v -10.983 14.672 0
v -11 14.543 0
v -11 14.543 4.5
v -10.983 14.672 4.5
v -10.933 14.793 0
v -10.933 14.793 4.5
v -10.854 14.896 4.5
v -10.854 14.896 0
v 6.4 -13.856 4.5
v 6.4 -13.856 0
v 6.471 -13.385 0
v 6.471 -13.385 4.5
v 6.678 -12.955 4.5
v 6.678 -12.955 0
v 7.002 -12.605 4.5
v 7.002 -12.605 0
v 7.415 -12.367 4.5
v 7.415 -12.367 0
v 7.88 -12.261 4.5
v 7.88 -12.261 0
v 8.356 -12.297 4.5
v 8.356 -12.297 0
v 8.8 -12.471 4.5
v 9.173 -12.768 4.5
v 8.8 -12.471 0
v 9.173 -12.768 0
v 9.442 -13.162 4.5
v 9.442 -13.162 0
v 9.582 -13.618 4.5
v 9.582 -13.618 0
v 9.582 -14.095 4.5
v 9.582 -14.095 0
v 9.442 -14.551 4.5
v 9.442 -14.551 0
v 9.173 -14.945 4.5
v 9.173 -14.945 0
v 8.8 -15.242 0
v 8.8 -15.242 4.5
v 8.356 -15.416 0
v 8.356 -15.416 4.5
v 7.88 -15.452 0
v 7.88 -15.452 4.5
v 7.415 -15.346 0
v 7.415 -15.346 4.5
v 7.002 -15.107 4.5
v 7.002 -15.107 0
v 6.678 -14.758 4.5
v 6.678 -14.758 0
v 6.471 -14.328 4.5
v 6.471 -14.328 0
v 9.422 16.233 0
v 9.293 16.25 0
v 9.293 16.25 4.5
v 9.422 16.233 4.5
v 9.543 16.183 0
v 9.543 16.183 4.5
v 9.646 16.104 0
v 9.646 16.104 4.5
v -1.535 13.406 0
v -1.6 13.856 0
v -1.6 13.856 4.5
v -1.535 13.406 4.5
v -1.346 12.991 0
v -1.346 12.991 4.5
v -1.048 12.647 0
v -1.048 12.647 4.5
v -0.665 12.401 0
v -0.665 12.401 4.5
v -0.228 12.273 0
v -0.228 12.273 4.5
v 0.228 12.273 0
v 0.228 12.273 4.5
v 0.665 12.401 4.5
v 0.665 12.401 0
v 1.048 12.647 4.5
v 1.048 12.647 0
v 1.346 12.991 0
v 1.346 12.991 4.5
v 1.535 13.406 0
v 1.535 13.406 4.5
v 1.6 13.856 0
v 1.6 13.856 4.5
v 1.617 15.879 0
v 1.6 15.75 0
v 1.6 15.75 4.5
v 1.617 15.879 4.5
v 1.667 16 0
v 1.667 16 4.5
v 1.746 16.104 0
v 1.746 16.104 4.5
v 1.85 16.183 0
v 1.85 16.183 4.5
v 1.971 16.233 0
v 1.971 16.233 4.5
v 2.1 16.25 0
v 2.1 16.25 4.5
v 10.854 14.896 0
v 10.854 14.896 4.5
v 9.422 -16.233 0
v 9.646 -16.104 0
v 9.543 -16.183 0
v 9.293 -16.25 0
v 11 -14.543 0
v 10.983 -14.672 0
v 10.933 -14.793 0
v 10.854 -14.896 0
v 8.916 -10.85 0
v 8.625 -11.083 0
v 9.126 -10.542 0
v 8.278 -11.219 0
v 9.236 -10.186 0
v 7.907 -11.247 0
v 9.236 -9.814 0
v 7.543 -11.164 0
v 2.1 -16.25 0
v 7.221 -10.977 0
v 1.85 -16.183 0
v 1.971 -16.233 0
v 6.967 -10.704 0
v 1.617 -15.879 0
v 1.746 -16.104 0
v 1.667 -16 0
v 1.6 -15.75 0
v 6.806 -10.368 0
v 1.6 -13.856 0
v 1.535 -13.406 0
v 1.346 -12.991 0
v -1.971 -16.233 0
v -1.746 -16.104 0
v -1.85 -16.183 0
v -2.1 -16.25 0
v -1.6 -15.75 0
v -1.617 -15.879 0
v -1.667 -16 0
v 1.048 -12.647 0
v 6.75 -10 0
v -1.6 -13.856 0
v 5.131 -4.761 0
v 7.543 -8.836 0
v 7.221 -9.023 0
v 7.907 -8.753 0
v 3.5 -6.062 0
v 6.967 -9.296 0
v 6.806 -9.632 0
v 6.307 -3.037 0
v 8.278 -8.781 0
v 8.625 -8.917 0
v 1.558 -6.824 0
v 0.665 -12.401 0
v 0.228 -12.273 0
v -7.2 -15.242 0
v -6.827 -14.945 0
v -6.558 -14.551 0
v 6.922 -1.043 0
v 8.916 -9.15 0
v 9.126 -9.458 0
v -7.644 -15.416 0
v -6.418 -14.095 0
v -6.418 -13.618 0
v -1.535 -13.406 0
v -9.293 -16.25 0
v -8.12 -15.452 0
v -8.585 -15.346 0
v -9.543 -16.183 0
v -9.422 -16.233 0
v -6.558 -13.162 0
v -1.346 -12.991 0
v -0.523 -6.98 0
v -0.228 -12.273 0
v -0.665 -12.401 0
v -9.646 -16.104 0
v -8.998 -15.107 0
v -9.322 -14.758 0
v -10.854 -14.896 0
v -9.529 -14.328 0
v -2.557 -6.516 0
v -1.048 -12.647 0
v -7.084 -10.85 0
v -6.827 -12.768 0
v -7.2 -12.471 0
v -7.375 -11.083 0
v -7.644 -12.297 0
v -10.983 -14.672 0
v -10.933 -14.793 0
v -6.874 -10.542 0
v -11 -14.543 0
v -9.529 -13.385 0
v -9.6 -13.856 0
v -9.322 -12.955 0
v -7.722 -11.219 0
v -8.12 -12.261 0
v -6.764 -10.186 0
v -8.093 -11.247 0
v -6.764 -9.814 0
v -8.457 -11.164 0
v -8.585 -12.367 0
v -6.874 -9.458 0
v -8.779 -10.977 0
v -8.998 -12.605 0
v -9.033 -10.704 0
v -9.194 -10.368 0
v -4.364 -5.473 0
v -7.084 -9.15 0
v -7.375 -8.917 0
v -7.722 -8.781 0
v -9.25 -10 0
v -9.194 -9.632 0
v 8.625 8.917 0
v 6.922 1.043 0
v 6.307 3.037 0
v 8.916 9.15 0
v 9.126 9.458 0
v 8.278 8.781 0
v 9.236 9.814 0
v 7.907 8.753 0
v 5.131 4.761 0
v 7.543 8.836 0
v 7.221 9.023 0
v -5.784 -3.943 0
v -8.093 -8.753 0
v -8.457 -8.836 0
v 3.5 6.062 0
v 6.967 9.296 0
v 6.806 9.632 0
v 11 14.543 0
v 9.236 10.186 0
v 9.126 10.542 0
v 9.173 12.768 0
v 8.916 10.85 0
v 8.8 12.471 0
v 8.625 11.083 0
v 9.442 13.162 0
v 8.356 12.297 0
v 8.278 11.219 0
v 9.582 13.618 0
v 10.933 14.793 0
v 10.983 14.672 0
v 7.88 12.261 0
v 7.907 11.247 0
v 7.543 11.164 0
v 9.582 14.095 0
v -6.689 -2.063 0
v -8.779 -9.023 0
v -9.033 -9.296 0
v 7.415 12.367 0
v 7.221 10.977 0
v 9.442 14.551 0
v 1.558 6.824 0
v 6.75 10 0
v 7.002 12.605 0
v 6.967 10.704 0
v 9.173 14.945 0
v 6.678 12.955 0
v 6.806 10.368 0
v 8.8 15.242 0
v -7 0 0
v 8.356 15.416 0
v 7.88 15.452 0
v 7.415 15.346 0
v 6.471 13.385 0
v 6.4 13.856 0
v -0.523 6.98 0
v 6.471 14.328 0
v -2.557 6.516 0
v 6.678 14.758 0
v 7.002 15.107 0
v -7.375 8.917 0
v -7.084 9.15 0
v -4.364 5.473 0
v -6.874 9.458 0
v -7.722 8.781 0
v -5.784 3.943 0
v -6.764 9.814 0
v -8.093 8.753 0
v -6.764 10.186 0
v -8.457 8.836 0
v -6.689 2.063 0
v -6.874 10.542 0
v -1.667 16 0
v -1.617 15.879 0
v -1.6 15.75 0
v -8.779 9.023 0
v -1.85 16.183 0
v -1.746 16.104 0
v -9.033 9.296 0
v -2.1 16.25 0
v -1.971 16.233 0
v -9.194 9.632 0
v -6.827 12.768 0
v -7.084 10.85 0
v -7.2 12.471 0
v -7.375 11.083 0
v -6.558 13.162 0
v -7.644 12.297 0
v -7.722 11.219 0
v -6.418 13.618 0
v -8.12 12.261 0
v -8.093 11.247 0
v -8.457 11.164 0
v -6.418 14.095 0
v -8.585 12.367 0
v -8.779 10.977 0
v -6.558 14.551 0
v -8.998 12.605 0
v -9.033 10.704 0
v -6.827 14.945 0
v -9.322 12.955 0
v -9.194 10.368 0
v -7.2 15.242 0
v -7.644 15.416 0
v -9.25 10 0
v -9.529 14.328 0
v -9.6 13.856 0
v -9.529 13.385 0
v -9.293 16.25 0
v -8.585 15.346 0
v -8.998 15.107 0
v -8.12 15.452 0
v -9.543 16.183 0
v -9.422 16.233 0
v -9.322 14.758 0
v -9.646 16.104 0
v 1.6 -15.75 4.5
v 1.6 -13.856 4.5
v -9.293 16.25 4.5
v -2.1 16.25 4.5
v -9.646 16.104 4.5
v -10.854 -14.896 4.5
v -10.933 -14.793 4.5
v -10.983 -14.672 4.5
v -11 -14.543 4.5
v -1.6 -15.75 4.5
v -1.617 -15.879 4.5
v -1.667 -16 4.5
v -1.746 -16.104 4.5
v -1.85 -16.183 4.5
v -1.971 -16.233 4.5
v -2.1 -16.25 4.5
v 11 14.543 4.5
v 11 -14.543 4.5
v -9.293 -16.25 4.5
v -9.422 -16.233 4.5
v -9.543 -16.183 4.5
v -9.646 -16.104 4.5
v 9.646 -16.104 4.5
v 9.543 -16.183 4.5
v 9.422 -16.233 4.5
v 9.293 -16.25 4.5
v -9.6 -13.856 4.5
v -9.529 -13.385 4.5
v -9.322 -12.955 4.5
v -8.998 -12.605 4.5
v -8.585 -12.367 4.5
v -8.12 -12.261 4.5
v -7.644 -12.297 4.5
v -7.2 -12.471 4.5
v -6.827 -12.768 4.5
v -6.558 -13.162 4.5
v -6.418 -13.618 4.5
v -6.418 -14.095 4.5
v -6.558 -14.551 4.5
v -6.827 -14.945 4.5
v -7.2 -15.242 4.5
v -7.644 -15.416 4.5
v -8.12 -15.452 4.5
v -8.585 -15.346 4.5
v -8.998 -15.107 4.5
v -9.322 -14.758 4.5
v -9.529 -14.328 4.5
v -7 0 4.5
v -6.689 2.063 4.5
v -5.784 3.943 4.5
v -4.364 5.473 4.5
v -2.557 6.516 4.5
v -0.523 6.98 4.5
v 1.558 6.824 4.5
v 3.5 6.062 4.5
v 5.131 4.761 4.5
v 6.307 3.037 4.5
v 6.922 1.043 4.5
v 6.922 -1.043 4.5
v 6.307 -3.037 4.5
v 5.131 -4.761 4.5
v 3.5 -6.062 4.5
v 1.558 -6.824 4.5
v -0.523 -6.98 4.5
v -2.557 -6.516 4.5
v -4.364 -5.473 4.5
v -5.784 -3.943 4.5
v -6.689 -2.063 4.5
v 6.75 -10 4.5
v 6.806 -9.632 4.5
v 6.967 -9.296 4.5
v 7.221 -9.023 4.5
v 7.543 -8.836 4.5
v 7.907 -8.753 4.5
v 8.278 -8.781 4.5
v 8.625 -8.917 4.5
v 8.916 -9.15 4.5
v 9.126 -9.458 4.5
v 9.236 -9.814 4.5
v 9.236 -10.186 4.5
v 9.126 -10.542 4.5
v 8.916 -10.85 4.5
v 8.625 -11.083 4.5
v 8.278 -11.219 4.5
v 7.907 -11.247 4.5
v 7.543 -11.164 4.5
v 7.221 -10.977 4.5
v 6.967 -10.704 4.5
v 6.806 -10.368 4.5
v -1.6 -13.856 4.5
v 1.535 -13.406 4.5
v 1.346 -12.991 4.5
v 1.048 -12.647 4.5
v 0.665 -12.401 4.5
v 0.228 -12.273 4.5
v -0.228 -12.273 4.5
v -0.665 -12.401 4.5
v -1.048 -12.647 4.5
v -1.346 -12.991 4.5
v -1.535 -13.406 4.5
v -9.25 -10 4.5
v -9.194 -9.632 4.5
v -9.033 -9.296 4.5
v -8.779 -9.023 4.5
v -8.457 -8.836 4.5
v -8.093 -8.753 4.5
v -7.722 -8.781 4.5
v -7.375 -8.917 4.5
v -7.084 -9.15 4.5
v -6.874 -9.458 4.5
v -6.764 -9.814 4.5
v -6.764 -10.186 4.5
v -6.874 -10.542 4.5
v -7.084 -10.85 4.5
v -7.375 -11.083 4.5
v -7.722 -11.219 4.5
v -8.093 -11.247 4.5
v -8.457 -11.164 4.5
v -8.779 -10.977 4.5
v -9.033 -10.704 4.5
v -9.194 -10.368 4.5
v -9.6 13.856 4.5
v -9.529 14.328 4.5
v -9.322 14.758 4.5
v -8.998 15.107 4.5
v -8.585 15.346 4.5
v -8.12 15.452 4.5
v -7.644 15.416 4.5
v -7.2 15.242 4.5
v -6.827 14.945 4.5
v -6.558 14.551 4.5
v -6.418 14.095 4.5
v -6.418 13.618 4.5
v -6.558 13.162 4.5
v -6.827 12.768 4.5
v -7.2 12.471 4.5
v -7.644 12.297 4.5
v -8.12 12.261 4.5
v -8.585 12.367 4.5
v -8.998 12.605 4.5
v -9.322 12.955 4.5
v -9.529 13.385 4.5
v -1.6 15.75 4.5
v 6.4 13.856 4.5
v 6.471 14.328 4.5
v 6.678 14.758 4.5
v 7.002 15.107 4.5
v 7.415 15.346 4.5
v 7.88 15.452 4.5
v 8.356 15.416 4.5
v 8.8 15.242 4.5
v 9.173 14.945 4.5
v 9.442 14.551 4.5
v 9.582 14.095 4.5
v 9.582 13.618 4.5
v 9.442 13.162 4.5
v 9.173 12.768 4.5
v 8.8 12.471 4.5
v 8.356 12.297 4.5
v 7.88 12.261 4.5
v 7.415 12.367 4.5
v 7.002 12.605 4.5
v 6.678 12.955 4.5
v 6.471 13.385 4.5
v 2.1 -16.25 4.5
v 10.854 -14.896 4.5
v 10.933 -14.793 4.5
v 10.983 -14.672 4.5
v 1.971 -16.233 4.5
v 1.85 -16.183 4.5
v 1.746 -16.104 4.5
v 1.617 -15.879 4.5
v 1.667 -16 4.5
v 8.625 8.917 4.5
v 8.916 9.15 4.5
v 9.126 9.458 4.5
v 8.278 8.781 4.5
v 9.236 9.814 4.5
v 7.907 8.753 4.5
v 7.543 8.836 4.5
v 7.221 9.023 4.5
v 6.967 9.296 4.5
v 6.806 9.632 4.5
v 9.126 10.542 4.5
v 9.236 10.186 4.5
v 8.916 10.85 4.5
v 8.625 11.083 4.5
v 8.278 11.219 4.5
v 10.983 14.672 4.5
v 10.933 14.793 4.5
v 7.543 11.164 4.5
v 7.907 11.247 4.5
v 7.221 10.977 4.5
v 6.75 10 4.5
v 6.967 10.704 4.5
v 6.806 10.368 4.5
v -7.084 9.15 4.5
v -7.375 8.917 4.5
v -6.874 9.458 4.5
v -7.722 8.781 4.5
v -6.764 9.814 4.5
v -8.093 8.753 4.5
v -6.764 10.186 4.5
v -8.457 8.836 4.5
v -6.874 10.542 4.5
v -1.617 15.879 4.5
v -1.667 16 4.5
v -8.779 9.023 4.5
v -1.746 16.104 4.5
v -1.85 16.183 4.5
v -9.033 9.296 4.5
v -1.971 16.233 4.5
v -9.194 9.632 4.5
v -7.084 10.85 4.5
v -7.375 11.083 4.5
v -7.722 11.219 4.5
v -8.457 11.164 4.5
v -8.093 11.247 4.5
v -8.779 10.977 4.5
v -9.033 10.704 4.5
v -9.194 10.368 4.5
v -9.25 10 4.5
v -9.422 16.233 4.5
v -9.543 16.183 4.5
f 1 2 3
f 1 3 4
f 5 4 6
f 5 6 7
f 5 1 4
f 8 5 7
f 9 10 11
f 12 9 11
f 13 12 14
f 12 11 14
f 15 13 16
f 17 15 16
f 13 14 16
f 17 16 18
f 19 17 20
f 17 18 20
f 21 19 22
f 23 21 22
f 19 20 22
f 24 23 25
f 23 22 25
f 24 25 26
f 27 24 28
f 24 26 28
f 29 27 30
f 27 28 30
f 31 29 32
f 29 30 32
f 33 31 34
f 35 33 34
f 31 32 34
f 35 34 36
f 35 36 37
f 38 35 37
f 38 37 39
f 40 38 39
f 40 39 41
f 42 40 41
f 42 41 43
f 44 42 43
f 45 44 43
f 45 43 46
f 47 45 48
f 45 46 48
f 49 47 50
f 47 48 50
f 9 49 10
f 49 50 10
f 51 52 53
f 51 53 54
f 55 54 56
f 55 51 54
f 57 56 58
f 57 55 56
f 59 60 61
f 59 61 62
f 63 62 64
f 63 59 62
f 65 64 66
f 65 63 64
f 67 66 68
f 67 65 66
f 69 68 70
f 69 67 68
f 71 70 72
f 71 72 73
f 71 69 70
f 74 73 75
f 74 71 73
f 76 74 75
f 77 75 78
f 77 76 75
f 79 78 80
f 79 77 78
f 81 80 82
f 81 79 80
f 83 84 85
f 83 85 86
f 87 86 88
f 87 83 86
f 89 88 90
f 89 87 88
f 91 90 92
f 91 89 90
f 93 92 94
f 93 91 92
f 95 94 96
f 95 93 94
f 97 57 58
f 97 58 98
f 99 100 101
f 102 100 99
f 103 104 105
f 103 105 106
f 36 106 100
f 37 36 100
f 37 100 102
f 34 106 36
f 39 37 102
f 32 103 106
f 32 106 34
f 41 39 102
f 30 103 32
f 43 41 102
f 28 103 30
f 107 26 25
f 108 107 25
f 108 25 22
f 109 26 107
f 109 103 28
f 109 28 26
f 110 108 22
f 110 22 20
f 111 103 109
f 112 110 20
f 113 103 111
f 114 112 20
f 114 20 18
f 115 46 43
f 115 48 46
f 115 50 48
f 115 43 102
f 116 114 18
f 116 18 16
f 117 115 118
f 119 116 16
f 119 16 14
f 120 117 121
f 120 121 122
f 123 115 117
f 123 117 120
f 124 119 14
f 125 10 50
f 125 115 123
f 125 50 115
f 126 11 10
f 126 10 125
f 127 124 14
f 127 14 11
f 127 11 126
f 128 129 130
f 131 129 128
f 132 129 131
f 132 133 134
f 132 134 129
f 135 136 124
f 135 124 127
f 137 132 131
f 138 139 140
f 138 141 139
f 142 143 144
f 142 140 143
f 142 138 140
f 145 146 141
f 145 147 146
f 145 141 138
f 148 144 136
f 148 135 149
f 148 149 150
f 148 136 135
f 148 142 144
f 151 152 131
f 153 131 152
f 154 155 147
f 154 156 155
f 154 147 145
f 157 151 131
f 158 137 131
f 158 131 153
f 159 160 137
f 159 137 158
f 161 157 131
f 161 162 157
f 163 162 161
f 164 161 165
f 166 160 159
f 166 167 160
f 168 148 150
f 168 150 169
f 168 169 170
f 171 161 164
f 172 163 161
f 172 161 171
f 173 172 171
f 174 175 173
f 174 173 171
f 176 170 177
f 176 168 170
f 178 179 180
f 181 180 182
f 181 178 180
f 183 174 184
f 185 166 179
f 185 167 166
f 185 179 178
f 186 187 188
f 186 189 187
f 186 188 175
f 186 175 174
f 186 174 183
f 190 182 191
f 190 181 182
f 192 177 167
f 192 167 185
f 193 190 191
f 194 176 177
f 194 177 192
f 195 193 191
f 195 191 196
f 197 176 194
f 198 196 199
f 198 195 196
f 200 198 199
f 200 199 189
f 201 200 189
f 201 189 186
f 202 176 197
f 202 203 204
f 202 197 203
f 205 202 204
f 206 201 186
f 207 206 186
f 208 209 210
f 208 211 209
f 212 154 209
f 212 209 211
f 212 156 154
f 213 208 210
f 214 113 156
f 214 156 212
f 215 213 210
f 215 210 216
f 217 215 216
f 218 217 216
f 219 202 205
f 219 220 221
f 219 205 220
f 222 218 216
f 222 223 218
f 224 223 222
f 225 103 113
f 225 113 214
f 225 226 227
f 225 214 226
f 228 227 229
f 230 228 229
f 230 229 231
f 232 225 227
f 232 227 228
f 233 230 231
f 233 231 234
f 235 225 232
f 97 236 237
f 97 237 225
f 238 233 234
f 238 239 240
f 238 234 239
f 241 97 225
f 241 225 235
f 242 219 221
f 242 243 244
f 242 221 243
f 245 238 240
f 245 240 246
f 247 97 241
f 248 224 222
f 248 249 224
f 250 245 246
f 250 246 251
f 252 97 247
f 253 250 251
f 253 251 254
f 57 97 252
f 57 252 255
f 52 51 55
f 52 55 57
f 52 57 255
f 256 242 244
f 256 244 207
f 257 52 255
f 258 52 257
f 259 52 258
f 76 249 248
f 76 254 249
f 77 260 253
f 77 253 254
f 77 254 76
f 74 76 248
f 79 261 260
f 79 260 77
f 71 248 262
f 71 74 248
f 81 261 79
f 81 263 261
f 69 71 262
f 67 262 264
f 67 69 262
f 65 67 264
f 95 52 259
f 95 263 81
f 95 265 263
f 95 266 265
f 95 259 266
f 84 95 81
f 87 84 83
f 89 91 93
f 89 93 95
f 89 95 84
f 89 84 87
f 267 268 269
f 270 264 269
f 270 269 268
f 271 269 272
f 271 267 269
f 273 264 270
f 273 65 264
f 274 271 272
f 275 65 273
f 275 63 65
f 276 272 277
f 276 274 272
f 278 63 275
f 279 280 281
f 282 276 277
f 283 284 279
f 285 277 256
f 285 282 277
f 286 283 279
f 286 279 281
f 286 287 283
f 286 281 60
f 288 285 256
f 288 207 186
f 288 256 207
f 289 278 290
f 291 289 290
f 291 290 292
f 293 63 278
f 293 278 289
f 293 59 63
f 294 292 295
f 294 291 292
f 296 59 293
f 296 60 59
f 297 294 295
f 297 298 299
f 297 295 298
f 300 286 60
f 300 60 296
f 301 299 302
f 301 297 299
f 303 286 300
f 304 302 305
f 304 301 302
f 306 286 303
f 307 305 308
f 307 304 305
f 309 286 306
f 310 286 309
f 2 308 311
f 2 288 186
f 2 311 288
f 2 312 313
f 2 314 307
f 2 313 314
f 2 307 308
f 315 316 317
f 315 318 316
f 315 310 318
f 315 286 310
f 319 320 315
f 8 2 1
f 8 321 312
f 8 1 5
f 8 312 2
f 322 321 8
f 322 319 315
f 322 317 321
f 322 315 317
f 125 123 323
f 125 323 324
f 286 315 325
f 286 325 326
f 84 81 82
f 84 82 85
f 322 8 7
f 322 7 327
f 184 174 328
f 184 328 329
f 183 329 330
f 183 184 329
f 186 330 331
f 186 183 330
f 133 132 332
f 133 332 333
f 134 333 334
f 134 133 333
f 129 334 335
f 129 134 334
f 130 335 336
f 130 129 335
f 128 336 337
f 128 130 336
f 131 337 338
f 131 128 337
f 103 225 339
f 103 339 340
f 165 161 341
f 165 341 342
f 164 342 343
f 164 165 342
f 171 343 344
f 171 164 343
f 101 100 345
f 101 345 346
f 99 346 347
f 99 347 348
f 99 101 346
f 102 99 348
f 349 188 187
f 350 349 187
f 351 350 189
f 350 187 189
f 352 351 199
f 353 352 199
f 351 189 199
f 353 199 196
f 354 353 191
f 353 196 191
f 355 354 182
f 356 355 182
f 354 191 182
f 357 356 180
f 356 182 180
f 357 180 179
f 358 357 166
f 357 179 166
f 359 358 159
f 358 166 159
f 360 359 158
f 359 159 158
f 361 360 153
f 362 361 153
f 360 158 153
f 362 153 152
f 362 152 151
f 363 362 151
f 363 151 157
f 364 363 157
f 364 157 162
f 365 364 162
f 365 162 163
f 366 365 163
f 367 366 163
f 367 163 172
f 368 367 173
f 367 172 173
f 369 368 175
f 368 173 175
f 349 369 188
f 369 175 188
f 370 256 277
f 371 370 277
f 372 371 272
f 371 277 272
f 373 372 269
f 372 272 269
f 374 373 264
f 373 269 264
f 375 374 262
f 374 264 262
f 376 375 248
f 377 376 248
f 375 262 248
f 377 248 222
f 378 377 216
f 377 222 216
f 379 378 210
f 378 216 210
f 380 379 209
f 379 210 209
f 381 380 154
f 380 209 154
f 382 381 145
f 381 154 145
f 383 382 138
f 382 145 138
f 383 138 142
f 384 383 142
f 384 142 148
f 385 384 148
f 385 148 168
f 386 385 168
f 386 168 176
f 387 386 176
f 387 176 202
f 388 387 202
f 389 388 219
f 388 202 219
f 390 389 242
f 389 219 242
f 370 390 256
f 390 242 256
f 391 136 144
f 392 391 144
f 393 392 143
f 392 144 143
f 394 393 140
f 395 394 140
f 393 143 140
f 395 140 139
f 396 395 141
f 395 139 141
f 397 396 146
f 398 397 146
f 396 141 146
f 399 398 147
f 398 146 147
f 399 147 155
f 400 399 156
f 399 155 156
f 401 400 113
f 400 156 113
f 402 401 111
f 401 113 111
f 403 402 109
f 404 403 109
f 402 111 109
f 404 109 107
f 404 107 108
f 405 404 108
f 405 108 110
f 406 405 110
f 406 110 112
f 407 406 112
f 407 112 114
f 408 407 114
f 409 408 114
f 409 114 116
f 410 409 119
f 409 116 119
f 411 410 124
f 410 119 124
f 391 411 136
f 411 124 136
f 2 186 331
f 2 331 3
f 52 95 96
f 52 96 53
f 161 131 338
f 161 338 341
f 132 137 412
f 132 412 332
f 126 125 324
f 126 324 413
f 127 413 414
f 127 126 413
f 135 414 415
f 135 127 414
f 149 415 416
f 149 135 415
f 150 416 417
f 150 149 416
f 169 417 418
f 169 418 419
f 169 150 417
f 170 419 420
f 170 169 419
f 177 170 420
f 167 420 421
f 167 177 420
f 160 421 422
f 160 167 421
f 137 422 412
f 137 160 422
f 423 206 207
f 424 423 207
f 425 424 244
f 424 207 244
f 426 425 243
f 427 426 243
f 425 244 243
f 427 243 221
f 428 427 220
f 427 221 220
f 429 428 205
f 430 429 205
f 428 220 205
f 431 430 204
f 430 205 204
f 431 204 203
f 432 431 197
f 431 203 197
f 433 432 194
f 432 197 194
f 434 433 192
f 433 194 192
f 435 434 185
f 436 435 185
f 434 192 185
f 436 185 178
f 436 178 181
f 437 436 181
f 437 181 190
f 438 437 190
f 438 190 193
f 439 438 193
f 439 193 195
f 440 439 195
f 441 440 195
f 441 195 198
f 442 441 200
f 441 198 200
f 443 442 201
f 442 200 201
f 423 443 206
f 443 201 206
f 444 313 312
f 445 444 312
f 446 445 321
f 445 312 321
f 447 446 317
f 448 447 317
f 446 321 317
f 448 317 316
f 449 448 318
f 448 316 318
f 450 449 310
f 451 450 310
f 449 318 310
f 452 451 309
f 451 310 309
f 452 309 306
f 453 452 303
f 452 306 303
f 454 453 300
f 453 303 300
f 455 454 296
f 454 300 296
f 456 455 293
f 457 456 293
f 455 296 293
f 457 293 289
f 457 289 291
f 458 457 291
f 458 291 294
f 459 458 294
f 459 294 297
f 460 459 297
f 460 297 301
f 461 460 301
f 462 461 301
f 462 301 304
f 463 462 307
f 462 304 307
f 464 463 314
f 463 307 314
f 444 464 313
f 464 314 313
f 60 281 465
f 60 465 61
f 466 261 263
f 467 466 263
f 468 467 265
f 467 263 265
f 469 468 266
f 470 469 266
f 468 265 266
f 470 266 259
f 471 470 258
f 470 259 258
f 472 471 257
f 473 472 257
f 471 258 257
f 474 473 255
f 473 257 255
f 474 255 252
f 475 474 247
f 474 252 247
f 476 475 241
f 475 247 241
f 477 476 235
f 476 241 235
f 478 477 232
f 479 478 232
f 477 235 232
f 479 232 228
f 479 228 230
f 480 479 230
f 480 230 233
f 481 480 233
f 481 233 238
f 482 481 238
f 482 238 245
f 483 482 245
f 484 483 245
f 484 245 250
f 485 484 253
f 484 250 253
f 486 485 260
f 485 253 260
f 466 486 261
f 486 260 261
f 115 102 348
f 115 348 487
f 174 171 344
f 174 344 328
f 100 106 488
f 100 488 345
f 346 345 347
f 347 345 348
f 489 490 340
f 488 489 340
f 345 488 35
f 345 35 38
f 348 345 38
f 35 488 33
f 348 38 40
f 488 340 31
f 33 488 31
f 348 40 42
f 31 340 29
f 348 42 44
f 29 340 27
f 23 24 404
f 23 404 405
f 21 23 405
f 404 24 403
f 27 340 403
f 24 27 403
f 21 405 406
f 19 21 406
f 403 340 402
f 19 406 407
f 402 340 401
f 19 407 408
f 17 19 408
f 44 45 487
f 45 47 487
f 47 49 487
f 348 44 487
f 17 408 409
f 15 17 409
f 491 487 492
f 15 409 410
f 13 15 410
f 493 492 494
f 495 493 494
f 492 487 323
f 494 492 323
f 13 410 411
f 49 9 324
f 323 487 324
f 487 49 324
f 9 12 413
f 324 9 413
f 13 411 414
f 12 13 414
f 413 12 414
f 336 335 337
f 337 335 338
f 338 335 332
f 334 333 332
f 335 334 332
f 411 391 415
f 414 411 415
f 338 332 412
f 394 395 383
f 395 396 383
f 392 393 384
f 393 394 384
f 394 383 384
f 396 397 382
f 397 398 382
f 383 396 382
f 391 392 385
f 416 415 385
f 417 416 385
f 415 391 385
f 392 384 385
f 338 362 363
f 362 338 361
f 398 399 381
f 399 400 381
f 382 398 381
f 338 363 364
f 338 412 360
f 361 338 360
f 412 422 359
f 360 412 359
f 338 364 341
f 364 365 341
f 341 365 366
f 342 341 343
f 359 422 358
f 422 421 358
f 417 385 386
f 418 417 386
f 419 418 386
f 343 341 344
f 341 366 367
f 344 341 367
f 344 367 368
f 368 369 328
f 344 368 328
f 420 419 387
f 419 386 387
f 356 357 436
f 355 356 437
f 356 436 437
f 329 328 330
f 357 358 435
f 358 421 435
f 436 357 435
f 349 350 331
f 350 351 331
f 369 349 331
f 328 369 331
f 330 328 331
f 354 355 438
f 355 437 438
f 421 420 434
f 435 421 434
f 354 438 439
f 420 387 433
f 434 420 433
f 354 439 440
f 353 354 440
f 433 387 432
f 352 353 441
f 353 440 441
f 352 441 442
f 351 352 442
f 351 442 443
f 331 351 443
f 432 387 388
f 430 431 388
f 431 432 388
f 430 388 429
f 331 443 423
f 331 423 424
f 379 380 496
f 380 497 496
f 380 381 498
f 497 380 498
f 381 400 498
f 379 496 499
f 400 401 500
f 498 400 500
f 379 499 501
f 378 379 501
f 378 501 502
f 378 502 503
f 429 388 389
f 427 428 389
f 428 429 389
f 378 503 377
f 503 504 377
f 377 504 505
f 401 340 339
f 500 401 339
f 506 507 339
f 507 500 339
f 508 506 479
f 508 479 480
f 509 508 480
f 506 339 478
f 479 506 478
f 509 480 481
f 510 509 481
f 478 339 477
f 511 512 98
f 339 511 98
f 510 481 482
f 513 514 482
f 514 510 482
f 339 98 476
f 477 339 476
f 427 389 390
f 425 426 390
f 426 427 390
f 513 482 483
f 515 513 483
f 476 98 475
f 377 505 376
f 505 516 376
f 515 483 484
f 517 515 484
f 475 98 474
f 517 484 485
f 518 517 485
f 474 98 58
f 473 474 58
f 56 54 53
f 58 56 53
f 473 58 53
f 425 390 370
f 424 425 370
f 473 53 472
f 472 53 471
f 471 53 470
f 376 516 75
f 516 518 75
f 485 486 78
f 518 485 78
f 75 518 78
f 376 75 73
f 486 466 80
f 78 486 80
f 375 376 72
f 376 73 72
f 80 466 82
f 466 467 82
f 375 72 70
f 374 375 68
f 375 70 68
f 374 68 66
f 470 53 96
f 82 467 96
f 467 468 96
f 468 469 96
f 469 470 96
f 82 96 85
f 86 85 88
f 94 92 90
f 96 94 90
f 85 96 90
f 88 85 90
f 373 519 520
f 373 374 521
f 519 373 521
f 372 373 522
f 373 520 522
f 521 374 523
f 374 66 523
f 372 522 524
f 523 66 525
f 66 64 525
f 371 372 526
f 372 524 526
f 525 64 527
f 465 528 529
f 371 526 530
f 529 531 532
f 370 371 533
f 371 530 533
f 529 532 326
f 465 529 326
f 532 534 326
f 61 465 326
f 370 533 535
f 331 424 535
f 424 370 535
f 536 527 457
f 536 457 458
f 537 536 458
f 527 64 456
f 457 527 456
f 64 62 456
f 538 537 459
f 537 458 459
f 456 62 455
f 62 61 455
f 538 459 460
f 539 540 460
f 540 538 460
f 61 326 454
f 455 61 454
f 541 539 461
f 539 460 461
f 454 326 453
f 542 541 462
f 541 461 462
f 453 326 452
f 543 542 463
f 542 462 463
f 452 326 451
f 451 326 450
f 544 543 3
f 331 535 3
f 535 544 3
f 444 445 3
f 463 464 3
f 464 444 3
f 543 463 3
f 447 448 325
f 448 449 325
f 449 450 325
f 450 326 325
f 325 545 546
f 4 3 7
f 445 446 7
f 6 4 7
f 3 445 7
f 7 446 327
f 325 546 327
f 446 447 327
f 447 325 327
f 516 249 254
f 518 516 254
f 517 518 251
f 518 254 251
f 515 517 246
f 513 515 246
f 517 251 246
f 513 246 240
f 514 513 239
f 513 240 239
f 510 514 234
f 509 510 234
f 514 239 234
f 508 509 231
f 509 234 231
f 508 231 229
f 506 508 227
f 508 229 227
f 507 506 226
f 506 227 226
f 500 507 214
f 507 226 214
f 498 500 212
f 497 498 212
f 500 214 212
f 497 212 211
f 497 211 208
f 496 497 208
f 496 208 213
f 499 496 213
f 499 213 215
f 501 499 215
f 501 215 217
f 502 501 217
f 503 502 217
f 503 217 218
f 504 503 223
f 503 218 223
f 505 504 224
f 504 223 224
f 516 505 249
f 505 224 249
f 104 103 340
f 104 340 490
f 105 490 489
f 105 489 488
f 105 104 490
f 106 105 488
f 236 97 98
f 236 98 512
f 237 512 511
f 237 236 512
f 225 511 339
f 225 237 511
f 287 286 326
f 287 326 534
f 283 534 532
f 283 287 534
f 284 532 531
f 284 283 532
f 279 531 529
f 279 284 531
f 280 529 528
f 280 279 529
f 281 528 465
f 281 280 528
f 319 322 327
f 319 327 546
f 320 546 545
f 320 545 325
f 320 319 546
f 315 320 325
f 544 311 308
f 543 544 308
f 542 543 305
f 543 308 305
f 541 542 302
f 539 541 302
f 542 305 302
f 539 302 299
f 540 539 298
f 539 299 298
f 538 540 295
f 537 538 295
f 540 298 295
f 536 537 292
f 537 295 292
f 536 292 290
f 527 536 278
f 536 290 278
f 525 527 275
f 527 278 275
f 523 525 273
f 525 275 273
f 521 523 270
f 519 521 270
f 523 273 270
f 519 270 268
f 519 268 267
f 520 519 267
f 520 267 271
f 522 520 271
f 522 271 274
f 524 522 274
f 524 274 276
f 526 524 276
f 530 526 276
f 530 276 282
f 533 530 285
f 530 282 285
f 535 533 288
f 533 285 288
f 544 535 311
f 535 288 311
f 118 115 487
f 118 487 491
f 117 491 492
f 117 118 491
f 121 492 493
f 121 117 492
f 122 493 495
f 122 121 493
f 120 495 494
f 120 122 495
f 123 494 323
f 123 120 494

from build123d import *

# Parameters (mm, degrees)
ESBO_O1_R                = 7
ESBO_O1_R_2              = 1.6
ESBO_O1_R_3              = 1.25
RESSALTO_EXTRUS_O1_DEPTH = 4.5


with BuildPart() as part:
    # Esboço1 → Ressalto-extrusão1 (new body)
    with BuildSketch(Plane(origin=(0, 0, 0), x_dir=(-1, 0, 0), z_dir=(0, 0, -1))):
        with BuildLine():
            Line((-2.1, 16.25), (-9.292893219, 16.25))
            ThreePointArc((-9.292893219, 16.25), (-9.484234935, 16.211939766), (-9.646446609, 16.103553391))
            Line((-9.646446609, 16.103553391), (-10.853553391, 14.896446609))
            ThreePointArc((-10.853553391, 14.896446609), (-10.961939766, 14.734234935), (-11, 14.542893219))
            Line((-11, 14.542893219), (-11, -14.542893219))
            ThreePointArc((-11, -14.542893219), (-10.961939766, -14.734234935), (-10.853553391, -14.896446609))
            Line((-10.853553391, -14.896446609), (-9.646446609, -16.103553391))
            ThreePointArc((-9.646446609, -16.103553391), (-9.484234935, -16.211939766), (-9.292893219, -16.25))
            Line((-9.292893219, -16.25), (-2.1, -16.25))
            ThreePointArc((-2.1, -16.25), (-1.746446609, -16.103553391), (-1.6, -15.75))
            Line((-1.6, -15.75), (-1.6, -13.856406461))
            ThreePointArc((-1.6, -13.856406461), (0, -12.256406461), (1.6, -13.856406461))
            Line((1.6, -13.856406461), (1.6, -15.75))
            ThreePointArc((1.6, -15.75), (1.746446609, -16.103553391), (2.1, -16.25))
            Line((2.1, -16.25), (9.292893219, -16.25))
            ThreePointArc((9.292893219, -16.25), (9.484234935, -16.211939766), (9.646446609, -16.103553391))
            Line((9.646446609, -16.103553391), (10.853553391, -14.896446609))
            ThreePointArc((10.853553391, -14.896446609), (10.961939766, -14.734234935), (11, -14.542893219))
            Line((11, -14.542893219), (11, 14.542893219))
            ThreePointArc((11, 14.542893219), (10.961939766, 14.734234935), (10.853553391, 14.896446609))
            Line((10.853553391, 14.896446609), (9.646446609, 16.103553391))
            ThreePointArc((9.646446609, 16.103553391), (9.484234935, 16.211939766), (9.292893219, 16.25))
            Line((9.292893219, 16.25), (2.1, 16.25))
            ThreePointArc((2.1, 16.25), (1.746446609, 16.103553391), (1.6, 15.75))
            Line((1.6, 15.75), (1.6, 13.856406461))
            ThreePointArc((1.6, 13.856406461), (0, 12.256406461), (-1.6, 13.856406461))
            Line((-1.6, 13.856406461), (-1.6, 15.75))
            ThreePointArc((-1.6, 15.75), (-1.746446609, 16.103553391), (-2.1, 16.25))
        make_face()
        Circle(ESBO_O1_R, mode=Mode.SUBTRACT)
        with Locations((-8, -13.85640646)):
            Circle(ESBO_O1_R_2, mode=Mode.SUBTRACT)
        with Locations((8, -13.85640646)):
            Circle(ESBO_O1_R_2, mode=Mode.SUBTRACT)
        with Locations((8, 13.85640646)):
            Circle(ESBO_O1_R_2, mode=Mode.SUBTRACT)
        with Locations((-8, 13.85640646)):
            Circle(ESBO_O1_R_2, mode=Mode.SUBTRACT)
        with Locations((-8, -10)):
            Circle(ESBO_O1_R_3, mode=Mode.SUBTRACT)
        with Locations((8, -10)):
            Circle(ESBO_O1_R_3, mode=Mode.SUBTRACT)
        with Locations((8, 10)):
            Circle(ESBO_O1_R_3, mode=Mode.SUBTRACT)
        with Locations((-8, 10)):
            Circle(ESBO_O1_R_3, mode=Mode.SUBTRACT)
    extrude(amount=-RESSALTO_EXTRUS_O1_DEPTH)


solid = part.part
